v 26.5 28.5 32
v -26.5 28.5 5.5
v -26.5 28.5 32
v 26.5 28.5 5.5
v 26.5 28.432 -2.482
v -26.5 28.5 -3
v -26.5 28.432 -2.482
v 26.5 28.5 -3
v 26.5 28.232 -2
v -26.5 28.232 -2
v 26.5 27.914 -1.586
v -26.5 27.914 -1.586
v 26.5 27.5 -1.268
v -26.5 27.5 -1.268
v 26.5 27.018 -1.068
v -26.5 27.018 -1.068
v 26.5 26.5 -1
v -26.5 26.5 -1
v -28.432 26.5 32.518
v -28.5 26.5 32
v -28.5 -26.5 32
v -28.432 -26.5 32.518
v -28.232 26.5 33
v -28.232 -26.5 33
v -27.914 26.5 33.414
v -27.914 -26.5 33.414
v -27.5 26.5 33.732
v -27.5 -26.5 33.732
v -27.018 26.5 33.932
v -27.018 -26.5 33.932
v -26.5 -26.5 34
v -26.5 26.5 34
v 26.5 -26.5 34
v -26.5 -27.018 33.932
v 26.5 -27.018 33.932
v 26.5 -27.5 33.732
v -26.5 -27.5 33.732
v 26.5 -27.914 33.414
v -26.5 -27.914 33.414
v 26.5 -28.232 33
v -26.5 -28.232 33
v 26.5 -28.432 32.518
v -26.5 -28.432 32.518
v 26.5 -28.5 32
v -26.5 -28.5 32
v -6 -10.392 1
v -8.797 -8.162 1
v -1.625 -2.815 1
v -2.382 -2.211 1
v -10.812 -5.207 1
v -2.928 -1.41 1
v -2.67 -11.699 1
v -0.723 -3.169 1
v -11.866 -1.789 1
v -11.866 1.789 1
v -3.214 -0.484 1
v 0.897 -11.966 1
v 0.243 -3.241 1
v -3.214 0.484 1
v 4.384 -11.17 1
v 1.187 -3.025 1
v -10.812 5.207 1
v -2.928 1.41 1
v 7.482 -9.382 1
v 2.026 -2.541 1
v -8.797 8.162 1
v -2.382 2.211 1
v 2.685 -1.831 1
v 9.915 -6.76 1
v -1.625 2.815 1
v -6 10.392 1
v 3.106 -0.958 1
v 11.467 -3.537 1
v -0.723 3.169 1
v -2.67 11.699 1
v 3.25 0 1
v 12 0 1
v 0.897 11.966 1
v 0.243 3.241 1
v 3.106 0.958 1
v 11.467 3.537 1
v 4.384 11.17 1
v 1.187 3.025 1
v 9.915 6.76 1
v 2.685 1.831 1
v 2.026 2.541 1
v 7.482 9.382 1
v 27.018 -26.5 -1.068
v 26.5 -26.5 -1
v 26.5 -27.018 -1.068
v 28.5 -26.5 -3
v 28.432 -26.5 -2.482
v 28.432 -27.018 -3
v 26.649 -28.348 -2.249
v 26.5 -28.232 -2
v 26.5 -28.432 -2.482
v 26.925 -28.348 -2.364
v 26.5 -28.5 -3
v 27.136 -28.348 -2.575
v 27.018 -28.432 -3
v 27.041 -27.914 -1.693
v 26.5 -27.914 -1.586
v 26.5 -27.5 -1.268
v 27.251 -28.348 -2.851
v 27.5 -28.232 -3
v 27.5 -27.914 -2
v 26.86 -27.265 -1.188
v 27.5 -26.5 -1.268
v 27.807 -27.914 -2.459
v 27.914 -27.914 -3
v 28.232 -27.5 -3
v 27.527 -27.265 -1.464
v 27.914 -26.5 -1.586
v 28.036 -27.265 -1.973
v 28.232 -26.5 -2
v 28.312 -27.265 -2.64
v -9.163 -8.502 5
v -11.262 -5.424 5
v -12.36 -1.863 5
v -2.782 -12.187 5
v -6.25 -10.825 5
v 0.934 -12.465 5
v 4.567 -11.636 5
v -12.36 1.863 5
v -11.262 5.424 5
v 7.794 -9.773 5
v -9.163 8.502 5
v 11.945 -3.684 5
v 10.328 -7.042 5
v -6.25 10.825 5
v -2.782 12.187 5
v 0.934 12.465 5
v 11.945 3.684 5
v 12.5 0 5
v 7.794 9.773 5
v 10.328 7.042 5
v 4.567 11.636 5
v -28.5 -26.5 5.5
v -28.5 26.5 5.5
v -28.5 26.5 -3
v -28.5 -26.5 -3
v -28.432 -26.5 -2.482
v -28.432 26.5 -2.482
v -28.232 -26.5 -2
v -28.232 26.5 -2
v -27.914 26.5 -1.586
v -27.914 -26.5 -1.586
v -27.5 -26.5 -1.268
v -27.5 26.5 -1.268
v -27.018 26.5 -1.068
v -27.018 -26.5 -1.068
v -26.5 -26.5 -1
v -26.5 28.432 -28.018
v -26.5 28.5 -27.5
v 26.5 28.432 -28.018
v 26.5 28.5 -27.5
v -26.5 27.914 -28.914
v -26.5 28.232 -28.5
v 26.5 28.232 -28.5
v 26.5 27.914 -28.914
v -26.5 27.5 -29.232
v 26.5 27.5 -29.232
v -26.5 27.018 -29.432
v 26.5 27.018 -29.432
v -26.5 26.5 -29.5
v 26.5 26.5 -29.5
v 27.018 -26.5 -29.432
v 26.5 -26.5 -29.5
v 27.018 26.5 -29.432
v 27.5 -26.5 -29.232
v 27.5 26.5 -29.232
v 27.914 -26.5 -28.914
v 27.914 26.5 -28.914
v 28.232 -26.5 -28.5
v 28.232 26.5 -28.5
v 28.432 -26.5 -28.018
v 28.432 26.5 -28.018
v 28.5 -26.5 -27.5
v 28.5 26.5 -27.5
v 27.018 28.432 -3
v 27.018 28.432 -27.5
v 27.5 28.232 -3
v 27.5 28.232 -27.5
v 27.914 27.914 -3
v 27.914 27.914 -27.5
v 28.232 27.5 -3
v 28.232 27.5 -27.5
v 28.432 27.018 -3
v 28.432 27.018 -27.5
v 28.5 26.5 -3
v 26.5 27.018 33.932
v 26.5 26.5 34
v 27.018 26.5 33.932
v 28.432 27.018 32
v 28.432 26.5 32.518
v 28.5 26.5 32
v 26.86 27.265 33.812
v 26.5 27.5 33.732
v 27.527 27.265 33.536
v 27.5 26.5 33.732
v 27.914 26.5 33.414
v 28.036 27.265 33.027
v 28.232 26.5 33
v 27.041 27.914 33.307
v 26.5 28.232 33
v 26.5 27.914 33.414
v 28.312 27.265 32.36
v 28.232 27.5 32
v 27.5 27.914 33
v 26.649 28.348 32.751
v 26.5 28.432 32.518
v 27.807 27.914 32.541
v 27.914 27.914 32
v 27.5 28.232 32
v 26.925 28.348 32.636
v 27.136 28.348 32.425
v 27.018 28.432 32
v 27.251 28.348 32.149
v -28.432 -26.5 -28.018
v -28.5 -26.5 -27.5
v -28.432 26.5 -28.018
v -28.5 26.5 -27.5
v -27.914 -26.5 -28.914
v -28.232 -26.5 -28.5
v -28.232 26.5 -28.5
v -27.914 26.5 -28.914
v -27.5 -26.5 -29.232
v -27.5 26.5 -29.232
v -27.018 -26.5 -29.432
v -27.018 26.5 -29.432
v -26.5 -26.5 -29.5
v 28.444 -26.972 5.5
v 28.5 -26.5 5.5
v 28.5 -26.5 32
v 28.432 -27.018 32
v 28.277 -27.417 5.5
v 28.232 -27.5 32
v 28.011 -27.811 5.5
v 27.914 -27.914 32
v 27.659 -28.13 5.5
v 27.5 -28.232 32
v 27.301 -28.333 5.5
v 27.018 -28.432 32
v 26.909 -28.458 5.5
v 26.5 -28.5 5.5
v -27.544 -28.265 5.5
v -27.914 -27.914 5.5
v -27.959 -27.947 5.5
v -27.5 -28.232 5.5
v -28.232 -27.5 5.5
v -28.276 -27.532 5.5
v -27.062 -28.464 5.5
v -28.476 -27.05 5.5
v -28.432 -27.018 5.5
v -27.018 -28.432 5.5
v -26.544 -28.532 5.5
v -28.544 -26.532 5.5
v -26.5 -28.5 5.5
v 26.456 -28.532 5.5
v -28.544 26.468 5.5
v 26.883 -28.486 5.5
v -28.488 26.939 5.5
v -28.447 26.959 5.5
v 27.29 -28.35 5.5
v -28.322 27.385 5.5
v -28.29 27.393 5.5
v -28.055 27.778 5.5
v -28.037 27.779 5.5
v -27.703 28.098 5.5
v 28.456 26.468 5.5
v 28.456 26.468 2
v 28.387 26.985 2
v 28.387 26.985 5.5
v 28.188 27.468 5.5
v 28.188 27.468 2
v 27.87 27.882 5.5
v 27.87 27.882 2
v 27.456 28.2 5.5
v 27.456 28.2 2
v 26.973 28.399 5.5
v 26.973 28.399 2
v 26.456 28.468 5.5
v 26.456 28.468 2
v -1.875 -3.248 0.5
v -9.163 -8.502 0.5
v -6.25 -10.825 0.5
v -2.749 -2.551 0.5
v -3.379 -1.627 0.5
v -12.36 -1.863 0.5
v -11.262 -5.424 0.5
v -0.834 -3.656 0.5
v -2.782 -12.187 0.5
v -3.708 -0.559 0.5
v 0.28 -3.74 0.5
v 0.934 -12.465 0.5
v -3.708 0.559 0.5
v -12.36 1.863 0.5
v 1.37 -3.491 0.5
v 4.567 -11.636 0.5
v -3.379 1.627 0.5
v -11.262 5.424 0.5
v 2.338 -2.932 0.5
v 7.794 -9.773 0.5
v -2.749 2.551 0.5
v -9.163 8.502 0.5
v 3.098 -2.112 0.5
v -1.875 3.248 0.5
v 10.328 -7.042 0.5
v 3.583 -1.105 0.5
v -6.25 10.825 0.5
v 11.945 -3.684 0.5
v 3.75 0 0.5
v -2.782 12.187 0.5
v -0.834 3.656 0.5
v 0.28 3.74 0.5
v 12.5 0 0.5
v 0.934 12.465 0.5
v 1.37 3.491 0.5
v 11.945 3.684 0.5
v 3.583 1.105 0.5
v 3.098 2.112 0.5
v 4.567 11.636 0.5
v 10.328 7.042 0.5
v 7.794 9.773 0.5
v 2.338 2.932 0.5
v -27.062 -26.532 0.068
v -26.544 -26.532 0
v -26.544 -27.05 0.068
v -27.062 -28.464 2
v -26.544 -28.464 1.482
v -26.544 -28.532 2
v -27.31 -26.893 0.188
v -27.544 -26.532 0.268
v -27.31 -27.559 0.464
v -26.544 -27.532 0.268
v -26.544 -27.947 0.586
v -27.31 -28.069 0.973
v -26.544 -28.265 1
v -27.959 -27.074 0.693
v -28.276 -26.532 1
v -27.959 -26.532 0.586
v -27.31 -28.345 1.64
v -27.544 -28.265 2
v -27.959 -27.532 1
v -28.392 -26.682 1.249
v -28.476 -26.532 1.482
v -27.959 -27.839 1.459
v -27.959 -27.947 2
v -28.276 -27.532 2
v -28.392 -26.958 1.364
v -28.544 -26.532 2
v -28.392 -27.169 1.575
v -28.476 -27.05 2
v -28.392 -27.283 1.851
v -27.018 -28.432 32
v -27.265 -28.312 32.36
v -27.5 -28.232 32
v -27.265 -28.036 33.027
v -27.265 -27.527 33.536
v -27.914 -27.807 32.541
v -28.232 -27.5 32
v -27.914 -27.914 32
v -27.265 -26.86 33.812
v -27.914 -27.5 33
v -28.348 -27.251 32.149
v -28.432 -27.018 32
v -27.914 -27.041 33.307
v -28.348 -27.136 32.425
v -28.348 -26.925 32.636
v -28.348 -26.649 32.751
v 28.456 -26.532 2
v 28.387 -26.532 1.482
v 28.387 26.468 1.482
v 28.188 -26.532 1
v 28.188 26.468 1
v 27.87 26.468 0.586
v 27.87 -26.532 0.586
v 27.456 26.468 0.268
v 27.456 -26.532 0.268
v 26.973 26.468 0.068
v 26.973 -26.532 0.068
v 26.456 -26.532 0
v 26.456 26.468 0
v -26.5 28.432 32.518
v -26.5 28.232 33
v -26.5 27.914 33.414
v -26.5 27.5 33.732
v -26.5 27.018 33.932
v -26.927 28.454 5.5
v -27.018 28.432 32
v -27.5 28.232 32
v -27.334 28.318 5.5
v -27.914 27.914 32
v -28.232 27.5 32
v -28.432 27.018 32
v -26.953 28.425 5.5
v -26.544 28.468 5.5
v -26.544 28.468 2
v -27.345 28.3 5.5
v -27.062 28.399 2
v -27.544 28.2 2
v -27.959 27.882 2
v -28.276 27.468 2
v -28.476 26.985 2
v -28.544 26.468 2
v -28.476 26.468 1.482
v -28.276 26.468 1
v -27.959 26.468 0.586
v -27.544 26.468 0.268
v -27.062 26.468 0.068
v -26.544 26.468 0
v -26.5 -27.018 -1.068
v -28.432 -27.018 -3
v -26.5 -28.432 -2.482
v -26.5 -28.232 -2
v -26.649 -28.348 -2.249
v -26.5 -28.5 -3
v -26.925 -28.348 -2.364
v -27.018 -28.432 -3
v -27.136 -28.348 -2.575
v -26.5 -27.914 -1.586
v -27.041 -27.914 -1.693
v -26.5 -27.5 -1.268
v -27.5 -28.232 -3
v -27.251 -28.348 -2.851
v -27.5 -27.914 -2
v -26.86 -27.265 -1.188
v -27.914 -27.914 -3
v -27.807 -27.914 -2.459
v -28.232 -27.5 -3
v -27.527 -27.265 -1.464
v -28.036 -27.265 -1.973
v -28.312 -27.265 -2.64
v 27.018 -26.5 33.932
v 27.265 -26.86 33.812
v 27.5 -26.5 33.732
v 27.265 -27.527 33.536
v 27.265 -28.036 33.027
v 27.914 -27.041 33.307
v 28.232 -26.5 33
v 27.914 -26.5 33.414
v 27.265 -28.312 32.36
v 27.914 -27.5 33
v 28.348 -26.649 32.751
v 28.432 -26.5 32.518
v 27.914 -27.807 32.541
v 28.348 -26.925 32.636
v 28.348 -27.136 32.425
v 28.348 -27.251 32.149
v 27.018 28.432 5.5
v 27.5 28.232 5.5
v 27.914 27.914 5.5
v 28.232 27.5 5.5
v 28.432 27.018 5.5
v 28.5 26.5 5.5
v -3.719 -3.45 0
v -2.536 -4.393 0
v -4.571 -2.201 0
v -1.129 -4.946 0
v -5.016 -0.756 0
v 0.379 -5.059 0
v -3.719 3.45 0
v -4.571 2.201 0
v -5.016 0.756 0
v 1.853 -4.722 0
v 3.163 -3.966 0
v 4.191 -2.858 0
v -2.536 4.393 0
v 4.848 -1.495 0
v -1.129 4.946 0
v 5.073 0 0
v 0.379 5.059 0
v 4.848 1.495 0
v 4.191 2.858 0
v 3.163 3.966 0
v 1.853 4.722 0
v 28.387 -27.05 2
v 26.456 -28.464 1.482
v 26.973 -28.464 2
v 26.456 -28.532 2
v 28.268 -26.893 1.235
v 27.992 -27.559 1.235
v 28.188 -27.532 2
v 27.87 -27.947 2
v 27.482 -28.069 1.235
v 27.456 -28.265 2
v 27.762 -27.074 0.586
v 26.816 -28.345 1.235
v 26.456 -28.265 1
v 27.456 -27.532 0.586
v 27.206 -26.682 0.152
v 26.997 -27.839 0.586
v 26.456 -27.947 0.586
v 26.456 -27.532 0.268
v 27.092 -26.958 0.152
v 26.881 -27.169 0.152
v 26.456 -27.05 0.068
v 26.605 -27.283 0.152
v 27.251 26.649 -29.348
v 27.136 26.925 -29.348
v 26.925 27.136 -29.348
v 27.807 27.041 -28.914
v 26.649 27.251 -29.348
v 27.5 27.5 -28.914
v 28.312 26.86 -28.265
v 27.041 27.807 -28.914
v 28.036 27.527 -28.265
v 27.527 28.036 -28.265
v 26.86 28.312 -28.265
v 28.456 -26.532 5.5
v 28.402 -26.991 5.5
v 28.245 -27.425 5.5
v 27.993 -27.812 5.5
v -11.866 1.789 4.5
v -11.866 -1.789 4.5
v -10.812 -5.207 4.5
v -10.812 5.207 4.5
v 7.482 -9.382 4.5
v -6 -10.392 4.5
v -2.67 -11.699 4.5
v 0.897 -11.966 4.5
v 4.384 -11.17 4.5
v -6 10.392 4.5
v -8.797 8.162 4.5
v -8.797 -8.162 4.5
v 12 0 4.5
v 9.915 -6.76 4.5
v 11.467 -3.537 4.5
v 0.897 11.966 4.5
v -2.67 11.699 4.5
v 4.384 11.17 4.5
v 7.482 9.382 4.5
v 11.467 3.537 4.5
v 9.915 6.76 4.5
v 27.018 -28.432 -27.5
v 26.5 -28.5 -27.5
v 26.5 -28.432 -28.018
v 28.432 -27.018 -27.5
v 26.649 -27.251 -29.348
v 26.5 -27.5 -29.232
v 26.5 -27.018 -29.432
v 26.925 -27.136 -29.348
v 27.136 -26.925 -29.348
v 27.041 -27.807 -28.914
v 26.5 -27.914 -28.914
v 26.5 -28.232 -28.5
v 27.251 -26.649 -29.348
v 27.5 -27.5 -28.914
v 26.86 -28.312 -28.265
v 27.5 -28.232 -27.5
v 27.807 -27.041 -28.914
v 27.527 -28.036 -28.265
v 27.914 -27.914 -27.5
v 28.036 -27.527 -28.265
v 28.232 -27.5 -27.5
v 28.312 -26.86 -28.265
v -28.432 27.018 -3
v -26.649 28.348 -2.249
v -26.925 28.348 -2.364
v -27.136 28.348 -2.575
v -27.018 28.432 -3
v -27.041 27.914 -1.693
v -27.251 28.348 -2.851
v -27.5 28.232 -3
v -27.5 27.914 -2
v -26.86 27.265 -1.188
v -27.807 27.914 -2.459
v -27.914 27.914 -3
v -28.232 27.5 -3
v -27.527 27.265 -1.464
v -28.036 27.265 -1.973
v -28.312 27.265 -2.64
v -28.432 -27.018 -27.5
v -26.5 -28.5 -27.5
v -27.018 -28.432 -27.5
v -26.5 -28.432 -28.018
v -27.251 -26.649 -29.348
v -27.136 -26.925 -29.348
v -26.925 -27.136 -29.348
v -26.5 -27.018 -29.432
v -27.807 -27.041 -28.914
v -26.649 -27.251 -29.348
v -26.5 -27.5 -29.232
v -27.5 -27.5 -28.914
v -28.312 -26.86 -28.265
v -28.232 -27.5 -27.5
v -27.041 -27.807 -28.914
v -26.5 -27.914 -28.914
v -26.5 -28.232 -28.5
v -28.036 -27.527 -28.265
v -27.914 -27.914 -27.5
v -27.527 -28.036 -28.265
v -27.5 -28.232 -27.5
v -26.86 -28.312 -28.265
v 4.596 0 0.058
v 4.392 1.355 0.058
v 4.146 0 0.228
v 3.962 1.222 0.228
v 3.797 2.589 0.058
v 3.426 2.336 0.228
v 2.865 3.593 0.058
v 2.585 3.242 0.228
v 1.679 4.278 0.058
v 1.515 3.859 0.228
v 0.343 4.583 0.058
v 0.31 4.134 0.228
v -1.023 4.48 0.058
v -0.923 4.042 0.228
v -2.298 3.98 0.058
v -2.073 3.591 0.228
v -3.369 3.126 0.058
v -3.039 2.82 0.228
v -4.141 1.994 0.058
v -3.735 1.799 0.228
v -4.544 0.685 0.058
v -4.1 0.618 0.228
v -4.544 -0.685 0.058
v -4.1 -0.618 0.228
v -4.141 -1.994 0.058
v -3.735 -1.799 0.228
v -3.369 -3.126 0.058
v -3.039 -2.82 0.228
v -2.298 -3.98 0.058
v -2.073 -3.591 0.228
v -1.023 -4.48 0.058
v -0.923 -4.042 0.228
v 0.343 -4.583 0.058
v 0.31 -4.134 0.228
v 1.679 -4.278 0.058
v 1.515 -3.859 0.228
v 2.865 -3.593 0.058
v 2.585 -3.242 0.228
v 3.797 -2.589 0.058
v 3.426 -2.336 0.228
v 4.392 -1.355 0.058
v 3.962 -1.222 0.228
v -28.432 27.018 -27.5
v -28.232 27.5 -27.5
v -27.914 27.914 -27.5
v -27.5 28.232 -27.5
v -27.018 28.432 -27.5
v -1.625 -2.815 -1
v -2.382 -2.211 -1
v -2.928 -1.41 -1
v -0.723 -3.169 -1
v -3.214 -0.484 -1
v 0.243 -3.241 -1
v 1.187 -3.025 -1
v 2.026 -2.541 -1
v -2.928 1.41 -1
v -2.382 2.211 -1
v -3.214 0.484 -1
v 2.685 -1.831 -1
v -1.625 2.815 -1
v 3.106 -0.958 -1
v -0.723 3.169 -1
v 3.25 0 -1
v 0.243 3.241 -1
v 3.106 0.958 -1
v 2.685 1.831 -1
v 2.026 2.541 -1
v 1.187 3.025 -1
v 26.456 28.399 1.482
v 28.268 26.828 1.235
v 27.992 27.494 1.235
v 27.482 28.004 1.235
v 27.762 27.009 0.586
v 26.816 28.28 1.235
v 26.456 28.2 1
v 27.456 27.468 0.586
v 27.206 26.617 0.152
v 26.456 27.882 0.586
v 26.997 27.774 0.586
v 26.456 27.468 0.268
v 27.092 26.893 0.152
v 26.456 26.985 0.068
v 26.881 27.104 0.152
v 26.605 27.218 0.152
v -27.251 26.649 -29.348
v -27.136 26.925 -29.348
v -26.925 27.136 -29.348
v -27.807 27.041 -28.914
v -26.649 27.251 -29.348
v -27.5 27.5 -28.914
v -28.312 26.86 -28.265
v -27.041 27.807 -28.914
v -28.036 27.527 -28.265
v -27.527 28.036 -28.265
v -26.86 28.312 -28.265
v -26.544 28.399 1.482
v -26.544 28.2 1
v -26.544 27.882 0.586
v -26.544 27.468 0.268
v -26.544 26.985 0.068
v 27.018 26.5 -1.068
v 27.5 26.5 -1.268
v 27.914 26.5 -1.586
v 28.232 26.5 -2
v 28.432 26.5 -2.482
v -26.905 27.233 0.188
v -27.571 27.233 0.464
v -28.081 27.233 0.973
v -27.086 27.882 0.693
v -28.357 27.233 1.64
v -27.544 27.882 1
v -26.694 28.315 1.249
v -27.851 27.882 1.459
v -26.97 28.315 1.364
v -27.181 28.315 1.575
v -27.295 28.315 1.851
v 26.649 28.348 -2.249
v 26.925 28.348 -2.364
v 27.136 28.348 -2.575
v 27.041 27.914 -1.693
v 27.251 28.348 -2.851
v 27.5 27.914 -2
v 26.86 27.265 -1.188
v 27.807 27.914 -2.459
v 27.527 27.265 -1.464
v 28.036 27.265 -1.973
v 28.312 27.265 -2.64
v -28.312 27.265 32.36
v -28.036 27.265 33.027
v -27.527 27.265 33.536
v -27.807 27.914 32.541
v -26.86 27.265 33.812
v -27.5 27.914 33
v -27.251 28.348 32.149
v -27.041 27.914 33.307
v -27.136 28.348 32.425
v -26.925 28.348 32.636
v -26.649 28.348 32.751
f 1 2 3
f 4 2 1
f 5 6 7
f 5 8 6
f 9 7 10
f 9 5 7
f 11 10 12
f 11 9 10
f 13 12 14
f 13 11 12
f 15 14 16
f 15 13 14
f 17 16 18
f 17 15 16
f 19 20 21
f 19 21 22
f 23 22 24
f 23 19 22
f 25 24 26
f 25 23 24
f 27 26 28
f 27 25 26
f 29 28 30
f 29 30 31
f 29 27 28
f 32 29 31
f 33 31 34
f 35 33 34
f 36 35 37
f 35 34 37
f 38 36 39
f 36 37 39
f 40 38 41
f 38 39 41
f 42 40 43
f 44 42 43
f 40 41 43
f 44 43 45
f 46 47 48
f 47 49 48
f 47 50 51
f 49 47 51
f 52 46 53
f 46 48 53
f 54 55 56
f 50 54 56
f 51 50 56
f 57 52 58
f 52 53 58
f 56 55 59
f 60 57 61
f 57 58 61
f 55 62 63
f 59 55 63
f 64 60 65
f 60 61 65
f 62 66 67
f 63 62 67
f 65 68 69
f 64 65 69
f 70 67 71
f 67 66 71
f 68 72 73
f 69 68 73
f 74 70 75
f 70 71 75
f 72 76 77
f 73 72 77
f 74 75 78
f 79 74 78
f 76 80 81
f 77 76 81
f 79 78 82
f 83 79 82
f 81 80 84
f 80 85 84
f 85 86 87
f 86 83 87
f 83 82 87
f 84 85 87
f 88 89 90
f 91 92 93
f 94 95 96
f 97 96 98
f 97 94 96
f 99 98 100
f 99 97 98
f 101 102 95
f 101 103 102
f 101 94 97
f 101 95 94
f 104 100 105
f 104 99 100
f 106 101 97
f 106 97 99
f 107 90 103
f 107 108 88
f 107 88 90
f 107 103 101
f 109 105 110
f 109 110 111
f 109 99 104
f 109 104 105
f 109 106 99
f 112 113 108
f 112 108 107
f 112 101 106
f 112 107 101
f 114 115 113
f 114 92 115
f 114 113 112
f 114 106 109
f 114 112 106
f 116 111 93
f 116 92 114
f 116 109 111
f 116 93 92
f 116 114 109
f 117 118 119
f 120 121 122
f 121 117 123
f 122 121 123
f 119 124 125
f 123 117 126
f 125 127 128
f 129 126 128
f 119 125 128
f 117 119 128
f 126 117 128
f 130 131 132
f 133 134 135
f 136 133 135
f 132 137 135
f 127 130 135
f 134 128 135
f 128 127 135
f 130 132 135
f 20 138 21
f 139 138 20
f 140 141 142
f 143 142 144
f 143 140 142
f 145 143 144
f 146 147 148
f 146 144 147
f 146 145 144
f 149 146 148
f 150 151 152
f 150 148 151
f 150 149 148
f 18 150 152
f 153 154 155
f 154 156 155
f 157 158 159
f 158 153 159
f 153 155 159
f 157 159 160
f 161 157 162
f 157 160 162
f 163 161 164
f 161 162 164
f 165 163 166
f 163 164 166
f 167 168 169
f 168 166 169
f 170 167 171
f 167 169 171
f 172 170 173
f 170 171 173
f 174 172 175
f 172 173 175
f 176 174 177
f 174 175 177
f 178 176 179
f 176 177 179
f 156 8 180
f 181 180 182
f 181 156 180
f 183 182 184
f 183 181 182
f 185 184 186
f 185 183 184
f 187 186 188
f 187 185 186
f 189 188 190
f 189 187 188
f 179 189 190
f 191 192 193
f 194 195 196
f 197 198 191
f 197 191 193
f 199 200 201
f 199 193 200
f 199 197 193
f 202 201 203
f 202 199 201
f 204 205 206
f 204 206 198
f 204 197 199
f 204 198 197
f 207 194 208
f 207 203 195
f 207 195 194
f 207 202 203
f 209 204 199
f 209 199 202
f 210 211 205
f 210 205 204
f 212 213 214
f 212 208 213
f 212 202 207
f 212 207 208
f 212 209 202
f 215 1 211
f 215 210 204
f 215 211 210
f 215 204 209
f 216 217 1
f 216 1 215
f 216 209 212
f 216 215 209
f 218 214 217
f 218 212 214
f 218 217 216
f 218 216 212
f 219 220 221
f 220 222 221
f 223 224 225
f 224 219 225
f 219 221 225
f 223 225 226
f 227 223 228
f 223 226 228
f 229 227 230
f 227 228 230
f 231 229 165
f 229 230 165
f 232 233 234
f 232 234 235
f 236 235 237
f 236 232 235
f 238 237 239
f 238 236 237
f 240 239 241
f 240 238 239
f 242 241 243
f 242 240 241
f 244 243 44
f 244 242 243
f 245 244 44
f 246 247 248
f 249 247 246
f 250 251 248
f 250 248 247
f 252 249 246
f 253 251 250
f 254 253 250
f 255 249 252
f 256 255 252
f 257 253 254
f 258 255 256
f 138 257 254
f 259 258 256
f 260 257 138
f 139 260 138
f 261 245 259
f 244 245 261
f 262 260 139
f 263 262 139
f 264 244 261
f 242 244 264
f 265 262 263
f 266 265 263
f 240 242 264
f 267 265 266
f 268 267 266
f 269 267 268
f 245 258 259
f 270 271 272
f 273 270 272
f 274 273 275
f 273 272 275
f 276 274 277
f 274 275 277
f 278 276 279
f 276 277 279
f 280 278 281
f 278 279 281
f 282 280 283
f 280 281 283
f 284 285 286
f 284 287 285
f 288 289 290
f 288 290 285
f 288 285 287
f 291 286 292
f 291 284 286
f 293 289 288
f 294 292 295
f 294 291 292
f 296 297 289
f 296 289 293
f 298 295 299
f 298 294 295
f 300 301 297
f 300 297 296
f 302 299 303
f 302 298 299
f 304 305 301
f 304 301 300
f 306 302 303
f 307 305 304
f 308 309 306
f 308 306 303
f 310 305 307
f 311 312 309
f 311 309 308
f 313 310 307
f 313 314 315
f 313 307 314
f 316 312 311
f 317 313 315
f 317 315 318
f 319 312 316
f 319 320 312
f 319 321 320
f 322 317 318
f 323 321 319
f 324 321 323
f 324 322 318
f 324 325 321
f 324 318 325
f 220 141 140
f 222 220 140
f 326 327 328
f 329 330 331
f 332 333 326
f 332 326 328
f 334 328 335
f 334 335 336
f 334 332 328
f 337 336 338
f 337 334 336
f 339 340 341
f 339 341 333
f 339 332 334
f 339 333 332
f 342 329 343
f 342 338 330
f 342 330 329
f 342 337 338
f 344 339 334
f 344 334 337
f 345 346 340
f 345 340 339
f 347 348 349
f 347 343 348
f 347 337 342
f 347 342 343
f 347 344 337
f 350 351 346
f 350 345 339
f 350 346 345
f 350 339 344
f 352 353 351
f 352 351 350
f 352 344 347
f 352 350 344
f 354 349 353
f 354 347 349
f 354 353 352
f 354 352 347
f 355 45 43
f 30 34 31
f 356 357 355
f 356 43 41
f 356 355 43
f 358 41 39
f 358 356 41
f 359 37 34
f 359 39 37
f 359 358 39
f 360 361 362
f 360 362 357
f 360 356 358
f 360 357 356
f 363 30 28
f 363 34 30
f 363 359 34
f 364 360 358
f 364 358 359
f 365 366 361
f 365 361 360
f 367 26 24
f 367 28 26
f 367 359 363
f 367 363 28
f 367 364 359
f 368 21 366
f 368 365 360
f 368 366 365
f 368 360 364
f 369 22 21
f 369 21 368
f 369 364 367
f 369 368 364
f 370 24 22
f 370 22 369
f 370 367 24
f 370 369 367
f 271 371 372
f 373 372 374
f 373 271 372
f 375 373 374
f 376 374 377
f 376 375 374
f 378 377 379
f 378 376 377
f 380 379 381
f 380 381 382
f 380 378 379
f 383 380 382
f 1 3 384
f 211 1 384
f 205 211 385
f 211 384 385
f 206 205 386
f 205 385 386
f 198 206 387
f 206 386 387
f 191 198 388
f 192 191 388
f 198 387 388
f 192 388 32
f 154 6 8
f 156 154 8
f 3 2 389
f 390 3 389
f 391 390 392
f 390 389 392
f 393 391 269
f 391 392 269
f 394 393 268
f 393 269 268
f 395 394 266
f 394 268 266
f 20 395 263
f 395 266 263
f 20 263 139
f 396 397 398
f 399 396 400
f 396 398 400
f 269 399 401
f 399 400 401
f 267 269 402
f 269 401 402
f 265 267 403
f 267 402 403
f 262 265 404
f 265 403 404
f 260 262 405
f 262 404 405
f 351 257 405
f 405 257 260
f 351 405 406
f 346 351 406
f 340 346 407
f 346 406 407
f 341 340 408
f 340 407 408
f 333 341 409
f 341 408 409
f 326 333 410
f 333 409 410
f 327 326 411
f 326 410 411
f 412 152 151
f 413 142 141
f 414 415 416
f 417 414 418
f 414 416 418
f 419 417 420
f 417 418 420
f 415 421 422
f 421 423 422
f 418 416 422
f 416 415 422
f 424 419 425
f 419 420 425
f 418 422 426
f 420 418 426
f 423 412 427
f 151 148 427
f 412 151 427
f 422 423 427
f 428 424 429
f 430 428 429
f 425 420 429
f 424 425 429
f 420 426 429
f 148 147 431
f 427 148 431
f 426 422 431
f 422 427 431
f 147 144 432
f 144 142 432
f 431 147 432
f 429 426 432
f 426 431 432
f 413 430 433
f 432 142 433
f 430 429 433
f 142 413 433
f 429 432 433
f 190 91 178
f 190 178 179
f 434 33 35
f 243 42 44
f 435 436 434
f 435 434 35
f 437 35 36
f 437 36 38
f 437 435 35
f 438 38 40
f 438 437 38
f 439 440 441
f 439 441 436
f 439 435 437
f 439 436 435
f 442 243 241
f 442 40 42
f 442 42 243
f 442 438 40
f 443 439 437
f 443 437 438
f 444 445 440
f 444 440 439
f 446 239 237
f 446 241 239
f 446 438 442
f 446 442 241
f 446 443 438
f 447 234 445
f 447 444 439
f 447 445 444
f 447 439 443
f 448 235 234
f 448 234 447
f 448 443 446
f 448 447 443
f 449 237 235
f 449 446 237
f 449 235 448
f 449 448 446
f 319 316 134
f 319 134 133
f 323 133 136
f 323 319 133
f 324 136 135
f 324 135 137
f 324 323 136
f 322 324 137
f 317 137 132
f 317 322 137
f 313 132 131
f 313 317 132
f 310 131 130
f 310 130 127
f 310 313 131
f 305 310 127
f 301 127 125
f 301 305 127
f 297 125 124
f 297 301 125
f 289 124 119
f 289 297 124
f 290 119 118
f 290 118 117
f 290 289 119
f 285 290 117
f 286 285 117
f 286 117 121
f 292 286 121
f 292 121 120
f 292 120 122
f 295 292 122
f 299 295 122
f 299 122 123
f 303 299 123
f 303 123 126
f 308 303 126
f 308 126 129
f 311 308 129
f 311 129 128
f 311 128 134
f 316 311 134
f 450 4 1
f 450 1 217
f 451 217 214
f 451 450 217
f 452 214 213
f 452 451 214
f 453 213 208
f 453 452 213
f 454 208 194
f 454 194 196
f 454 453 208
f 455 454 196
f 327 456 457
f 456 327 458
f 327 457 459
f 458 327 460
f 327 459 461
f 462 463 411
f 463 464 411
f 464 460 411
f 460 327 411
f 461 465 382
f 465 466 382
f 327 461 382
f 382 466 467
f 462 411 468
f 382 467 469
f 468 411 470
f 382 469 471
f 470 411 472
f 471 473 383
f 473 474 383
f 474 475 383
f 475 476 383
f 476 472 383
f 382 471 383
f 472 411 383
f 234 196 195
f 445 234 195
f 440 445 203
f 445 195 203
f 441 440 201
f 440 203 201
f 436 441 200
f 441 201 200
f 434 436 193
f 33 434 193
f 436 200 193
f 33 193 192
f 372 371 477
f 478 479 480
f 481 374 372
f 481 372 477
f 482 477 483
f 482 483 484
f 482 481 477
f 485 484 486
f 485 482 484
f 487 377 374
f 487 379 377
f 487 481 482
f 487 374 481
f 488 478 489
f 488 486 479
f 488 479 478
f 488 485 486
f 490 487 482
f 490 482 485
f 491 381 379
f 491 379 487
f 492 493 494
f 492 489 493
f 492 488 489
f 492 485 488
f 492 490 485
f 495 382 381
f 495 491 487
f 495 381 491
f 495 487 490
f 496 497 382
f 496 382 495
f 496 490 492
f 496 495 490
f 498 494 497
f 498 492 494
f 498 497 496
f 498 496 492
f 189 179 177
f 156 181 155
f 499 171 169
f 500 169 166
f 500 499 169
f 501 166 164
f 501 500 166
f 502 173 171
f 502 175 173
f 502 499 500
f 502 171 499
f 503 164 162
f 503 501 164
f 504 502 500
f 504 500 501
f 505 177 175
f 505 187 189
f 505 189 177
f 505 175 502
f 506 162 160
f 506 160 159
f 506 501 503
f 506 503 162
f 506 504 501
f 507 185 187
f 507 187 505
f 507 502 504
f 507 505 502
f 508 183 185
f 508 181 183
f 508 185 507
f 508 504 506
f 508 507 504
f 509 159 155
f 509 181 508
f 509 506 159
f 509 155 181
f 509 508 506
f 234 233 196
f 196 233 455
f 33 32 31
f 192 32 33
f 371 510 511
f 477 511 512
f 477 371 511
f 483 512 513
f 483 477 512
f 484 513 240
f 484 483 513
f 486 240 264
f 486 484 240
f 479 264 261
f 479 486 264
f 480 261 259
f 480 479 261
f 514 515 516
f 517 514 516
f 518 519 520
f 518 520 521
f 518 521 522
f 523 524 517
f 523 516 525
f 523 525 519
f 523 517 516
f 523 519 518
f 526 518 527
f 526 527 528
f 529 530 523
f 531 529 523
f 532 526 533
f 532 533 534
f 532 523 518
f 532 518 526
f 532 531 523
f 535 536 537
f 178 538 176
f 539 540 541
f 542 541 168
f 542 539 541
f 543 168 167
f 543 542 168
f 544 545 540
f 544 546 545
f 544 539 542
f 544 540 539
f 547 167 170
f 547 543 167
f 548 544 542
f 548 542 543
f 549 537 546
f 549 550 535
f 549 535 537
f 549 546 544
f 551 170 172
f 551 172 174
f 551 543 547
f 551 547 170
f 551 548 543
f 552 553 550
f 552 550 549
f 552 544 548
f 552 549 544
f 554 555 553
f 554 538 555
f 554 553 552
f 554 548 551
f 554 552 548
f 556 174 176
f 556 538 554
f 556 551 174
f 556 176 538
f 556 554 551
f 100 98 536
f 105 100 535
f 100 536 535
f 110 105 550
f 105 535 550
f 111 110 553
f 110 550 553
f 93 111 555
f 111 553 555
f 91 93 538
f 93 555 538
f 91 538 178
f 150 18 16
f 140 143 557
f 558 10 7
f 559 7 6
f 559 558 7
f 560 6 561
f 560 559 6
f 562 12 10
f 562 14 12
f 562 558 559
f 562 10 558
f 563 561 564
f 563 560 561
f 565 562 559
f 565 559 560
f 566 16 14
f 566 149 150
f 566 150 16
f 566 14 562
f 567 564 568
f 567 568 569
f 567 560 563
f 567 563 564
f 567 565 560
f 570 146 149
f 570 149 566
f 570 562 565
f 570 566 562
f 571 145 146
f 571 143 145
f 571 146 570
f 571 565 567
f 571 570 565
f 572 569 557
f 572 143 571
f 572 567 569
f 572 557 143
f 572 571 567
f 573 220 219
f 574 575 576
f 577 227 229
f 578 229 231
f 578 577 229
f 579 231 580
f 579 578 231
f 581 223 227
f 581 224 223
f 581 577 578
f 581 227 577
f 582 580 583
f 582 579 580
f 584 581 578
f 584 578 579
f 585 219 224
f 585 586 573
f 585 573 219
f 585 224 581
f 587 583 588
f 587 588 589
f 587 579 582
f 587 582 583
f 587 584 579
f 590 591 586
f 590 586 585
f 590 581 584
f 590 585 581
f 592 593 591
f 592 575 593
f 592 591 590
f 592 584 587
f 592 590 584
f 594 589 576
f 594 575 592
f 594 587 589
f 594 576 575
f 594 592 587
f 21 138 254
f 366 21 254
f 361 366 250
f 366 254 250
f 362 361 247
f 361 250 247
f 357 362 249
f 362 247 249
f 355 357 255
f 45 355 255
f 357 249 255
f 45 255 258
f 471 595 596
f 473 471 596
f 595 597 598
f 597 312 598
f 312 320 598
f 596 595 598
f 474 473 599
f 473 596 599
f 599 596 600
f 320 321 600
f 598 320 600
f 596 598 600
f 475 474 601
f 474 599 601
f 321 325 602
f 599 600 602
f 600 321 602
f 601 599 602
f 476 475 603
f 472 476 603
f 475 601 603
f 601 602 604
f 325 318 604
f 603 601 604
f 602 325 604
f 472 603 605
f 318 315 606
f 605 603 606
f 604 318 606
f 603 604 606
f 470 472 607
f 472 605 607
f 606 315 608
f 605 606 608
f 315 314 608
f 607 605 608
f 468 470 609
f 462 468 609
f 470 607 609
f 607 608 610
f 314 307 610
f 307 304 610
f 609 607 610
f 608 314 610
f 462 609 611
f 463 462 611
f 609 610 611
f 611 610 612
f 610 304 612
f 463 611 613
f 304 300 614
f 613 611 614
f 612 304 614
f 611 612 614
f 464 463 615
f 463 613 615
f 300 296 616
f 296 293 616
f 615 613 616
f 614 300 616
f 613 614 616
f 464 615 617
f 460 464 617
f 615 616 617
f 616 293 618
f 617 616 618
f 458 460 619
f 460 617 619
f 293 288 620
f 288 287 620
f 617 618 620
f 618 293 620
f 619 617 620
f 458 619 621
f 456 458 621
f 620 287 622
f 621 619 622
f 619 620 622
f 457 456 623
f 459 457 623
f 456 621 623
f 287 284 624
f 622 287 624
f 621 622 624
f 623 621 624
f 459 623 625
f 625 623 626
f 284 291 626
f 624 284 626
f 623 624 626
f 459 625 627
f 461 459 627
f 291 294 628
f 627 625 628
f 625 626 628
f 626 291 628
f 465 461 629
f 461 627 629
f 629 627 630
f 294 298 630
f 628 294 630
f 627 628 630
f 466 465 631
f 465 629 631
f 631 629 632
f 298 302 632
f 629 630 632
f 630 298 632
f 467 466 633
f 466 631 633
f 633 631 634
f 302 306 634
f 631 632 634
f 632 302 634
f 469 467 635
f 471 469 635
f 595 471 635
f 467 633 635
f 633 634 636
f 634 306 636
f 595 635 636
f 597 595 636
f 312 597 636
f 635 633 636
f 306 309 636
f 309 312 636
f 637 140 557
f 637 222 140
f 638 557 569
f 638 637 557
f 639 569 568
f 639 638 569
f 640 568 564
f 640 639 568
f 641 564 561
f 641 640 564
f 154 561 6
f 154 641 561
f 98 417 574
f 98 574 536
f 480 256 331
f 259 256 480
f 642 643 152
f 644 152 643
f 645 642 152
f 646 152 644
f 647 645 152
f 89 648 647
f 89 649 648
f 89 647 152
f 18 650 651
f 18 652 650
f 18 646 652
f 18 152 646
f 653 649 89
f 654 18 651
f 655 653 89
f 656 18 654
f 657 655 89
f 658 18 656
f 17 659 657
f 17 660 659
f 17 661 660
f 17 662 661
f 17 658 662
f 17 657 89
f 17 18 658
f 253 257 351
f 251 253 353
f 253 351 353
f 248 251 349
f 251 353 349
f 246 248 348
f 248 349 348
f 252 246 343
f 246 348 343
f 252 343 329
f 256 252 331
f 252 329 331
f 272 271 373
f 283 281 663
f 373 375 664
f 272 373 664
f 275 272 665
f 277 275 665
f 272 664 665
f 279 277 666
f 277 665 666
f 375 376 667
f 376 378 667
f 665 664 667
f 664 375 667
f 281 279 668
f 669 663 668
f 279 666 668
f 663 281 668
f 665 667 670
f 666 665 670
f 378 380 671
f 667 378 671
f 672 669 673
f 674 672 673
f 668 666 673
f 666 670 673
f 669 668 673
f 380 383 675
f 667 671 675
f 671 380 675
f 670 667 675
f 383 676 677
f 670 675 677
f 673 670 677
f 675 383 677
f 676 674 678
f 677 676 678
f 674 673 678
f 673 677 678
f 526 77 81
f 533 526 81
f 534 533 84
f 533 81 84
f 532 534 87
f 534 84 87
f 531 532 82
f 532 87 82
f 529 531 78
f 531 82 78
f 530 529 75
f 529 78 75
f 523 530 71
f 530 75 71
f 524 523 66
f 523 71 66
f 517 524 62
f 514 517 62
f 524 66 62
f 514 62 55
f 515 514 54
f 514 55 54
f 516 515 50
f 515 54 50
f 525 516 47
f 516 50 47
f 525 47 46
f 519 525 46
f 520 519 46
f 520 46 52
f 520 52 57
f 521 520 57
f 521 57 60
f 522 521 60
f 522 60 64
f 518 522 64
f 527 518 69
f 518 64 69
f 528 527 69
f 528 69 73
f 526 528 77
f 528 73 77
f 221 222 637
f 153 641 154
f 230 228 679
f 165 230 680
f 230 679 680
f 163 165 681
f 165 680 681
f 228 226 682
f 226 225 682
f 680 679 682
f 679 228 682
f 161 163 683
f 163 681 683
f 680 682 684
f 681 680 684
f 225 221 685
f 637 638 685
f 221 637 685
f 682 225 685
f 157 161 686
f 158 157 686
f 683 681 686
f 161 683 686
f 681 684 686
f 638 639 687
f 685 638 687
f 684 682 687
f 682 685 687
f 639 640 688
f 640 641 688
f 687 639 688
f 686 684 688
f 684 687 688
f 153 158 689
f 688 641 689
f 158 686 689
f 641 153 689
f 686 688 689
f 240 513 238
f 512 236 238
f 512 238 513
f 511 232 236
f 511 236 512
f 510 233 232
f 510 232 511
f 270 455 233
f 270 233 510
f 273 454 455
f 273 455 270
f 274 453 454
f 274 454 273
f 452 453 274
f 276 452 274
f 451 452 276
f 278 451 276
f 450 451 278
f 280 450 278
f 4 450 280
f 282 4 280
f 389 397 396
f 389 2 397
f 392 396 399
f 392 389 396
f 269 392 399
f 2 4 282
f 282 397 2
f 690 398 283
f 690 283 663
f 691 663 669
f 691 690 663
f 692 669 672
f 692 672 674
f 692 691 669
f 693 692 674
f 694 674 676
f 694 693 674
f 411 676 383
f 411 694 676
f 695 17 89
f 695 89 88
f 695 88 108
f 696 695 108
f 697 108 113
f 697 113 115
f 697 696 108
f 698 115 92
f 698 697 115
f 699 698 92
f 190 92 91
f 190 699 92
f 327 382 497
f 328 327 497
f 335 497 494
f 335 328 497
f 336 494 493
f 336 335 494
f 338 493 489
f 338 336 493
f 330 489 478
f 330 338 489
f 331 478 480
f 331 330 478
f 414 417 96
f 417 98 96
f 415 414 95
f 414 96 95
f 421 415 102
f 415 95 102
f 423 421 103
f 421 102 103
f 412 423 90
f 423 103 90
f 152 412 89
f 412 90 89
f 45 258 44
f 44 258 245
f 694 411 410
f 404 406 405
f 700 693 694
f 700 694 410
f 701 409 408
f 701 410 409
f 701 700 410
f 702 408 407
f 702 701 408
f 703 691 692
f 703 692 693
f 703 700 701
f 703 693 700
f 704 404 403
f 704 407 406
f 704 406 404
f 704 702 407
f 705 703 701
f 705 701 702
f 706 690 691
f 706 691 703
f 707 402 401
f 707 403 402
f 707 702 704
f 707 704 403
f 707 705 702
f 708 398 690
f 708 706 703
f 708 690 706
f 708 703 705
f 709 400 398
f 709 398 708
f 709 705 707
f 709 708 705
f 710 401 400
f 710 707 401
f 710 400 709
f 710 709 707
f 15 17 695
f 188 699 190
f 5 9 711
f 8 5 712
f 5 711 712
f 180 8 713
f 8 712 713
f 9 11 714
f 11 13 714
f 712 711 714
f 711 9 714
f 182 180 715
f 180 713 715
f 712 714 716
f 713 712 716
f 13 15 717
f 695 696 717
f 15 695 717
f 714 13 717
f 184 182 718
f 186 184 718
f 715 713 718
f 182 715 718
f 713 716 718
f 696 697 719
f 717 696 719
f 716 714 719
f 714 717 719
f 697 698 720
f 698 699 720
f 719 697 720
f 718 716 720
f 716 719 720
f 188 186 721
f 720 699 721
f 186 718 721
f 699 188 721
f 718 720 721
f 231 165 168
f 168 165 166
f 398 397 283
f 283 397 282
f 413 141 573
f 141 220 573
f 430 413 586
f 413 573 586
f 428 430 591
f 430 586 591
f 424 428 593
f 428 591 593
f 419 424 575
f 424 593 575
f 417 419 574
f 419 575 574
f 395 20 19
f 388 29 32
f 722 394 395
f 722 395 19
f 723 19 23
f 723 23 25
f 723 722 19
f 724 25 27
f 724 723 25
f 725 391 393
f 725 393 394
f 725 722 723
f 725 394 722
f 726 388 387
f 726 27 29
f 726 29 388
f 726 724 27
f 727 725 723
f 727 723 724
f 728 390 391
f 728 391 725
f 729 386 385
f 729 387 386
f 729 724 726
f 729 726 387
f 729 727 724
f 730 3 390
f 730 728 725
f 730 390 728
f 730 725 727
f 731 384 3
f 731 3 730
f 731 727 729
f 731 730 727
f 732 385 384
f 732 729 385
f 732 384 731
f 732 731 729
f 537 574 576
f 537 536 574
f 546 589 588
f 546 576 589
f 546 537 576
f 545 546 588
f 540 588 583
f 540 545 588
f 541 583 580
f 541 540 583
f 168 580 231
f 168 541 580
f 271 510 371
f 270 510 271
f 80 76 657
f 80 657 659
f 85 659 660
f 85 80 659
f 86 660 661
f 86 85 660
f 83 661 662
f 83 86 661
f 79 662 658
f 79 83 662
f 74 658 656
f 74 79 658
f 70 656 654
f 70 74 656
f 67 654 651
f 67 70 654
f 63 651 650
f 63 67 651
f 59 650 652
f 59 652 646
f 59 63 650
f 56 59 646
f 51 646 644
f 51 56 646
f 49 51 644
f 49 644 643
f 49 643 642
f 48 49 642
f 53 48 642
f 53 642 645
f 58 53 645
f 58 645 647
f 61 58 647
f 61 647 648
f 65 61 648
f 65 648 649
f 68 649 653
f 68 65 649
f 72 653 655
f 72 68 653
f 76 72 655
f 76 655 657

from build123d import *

# Parameters (mm, degrees)
F0_R          = 13.5
F0_R_2        = 12.5
F1_DEPTH      = 5
F3_R          = 12
F4_DEPTH      = 3.5
F5_R          = 12.5
F5_R_2        = 3.75
F6_DEPTH      = 0.5
F8_R          = 13.5
F9_DEPTH      = 0.5
F10_R         = 3.25
F11_DEPTH     = 2
F13_W         = 57
F13_H         = 57
F14_DEPTH     = 28.5
F15_R         = 2
F17_W         = 57
F17_H         = 57
F18_DEPTH     = 28.5
F19_W         = 57
F19_H         = 57
F19_R         = 13.5
F20_DEPTH     = 5.5
F21_T1_DEPTH  = 26.5
F21_T3_DEPTH  = 5.5
F21_T5_DEPTH  = 53
F21_T7_DEPTH  = 53
F21_S11_W     = 2.04
F21_S11_H     = 2.04
F21_T12_DEPTH = 2.04
F21_S17_W     = 2.04
F21_S17_H     = 2.04
F21_T18_DEPTH = 2.04
F21_S23_W     = 2.04
F21_S23_H     = 2.04
F21_T24_DEPTH = 2.04
F21_S29_W     = 2.04
F21_S29_H     = 2.04
F21_T30_DEPTH = 2.04
F22_T1_DEPTH  = 3.5
F22_T3_DEPTH  = 8.5
F22_T5_DEPTH  = 53
F22_T7_DEPTH  = 53
F22_S11_W     = 2.04
F22_S11_H     = 2.04
F22_T12_DEPTH = 2.04
F22_S17_W     = 2.04
F22_S17_H     = 2.04
F22_T18_DEPTH = 2.04
F22_S23_W     = 2.04
F22_S23_H     = 2.04
F22_T24_DEPTH = 2.04
F22_T28_ANGLE = 89.9999999955


# Not quite as in the source:
# - a fillet or chamfer that OpenCascade refuses, or shapes differently, is made with other operations: its cross-section is extruded or revolved along the edge and cut away or added


with BuildPart() as f1:
    # F0 (on Top) → F1 (new body)
    with BuildSketch(Plane.XY):
        Circle(F0_R)
        Circle(F0_R_2, mode=Mode.SUBTRACT)
    extrude(amount=F1_DEPTH)

    # F5 (on Top) → F6 (join)
    with BuildSketch(Plane.XY):
        Circle(F5_R)
        Circle(F5_R_2, mode=Mode.SUBTRACT)
    extrude(amount=F6_DEPTH)

    # F8 (on offset) → F9 (join)
    with BuildSketch(Plane.XY.offset(5)):
        Circle(F8_R)
    extrude(amount=F9_DEPTH)

    # F17 (on offset) → F18 (join)
    with BuildSketch(Plane.XY.offset(5.5)):
        Rectangle(F17_W, F17_H)
    extrude(amount=F18_DEPTH)

    # F19 (on offset) → F20 (join)
    with BuildSketch(Plane.XY.offset(5.5)):
        with Locations((-0.0443849862, -0.0324733704)):
            Rectangle(F19_W, F19_H)
        Circle(F19_R, mode=Mode.SUBTRACT)
    extrude(amount=-F20_DEPTH)

    # F21: fillet of radius 2 on 9 edges, made by hand

    # F21_s2 → F21_t1 (cut)
    with BuildSketch(Plane.XY.offset(5.5)):
        with BuildLine():
            ThreePointArc((26.5, 28.5), (27.9142135624, 27.9142135624), (28.5, 26.5))
            Line((28.5, 26.5), (28.54, 26.5))
            Line((28.54, 26.5), (28.54, 28.54))
            Line((28.54, 28.54), (26.5, 28.54))
            Line((26.5, 28.54), (26.5, 28.5))
        make_face()
        with BuildLine():
            ThreePointArc((28.5, -26.5), (27.9142135624, -27.9142135624), (26.5, -28.5))
            Line((26.5, -28.5), (26.5, -28.54))
            Line((26.5, -28.54), (28.54, -28.54))
            Line((28.54, -28.54), (28.54, -26.5))
            Line((28.54, -26.5), (28.5, -26.5))
        make_face()
        with BuildLine():
            ThreePointArc((-28.5, -26.5), (-27.9142135624, -27.9142135624), (-26.5, -28.5))
            Line((-26.5, -28.5), (-26.5, -28.54))
            Line((-26.5, -28.54), (-28.54, -28.54))
            Line((-28.54, -28.54), (-28.54, -26.5))
            Line((-28.54, -26.5), (-28.5, -26.5))
        make_face()
        with BuildLine():
            ThreePointArc((-26.5, 28.5), (-27.9142135624, 27.9142135624), (-28.5, 26.5))
            Line((-28.5, 26.5), (-28.54, 26.5))
            Line((-28.54, 26.5), (-28.54, 28.54))
            Line((-28.54, 28.54), (-26.5, 28.54))
            Line((-26.5, 28.54), (-26.5, 28.5))
        make_face()
    extrude(amount=F21_T1_DEPTH, mode=Mode.SUBTRACT)

    # F21_s4 → F21_t3 (cut)
    with BuildSketch(Plane.XY):
        with BuildLine():
            ThreePointArc((28.4556150138, 26.4675266296), (27.8698285762, 27.8817401919), (26.4556150138, 28.4675266296))
            Line((26.4556150138, 28.4675266296), (26.4556150138, 28.5075266296))
            Line((26.4556150138, 28.5075266296), (28.4956150138, 28.5075266296))
            Line((28.4956150138, 28.5075266296), (28.4956150138, 26.4675266296))
            Line((28.4956150138, 26.4675266296), (28.4556150138, 26.4675266296))
        make_face()
    extrude(amount=F21_T3_DEPTH, mode=Mode.SUBTRACT)

    # F21_s6 → F21_t5 (cut)
    with BuildSketch(Plane.YZ.offset(-26.5)):
        with BuildLine():
            ThreePointArc((28.5, 32), (27.9142135624, 33.4142135624), (26.5, 34))
            Line((26.5, 34), (26.5, 34.04))
            Line((26.5, 34.04), (28.54, 34.04))
            Line((28.54, 34.04), (28.54, 32))
            Line((28.54, 32), (28.5, 32))
        make_face()
        with BuildLine():
            ThreePointArc((-26.5, 34), (-27.9142135624, 33.4142135624), (-28.5, 32))
            Line((-28.5, 32), (-28.54, 32))
            Line((-28.54, 32), (-28.54, 34.04))
            Line((-28.54, 34.04), (-26.5, 34.04))
            Line((-26.5, 34.04), (-26.5, 34))
        make_face()
    extrude(amount=F21_T5_DEPTH, mode=Mode.SUBTRACT)

    # F21_s8 → F21_t7 (cut)
    with BuildSketch(Plane.XZ.offset(-26.5)):
        with BuildLine():
            ThreePointArc((-28.5, 32), (-27.9142135624, 33.4142135624), (-26.5, 34))
            Line((-26.5, 34), (-26.5, 34.04))
            Line((-26.5, 34.04), (-28.54, 34.04))
            Line((-28.54, 34.04), (-28.54, 32))
            Line((-28.54, 32), (-28.5, 32))
        make_face()
        with BuildLine():
            ThreePointArc((28.5, 32), (27.9142135624, 33.4142135624), (26.5, 34))
            Line((26.5, 34), (26.5, 34.04))
            Line((26.5, 34.04), (28.54, 34.04))
            Line((28.54, 34.04), (28.54, 32))
            Line((28.54, 32), (28.5, 32))
        make_face()
    extrude(amount=F21_T7_DEPTH, mode=Mode.SUBTRACT)


with BuildPart() as f4:
    # F3 (on offset) → F4 (new body)
    with BuildSketch(Plane.XY.offset(1)):
        Circle(F3_R)
    extrude(amount=F4_DEPTH)

    # F10 (on offset) → F11 (join)
    with BuildSketch(Plane.XY.offset(1)):
        Circle(F10_R)
    extrude(amount=-F11_DEPTH)

    # F13 (on offset) → F14 (join)
    with BuildSketch(Plane.XY.offset(-1)):
        Rectangle(F13_W, F13_H)
    extrude(amount=-F14_DEPTH)

    # F15
    f15_edges = [f4.edges().sort_by_distance(p)[0] for p in [
        (28.5, 0, -1),
        (-28.5, 0, -1),
        (0, -28.5, -1),
        (0, 28.5, -1),
        (-28.5, 28.5, -15.25),
        (28.5, 28.5, -15.25),
        (-28.5, -28.5, -15.25),
        (28.5, -28.5, -15.25),
        (-28.5, 0, -29.5),
        (0, -28.5, -29.5),
        (28.5, 0, -29.5),
        (0, 28.5, -29.5),
    ]]
    fillet(f15_edges, radius=F15_R)


with BuildPart() as f21_tool10:
    # F21_s11 → F21_t12 (new body)
    with BuildSketch(Plane.XZ.offset(-26.5)):
        with Locations((27.52, 33.02)):
            Rectangle(F21_S11_W, F21_S11_H)
    extrude(amount=-F21_T12_DEPTH)

    # F21_s13 → F21_t14 (revolve, cut)
    with BuildSketch(Plane(origin=(26.5, 26.5, 32), x_dir=(-0.7071067812, 0, -0.7071067812), z_dir=(0.7071067812, 0, -0.7071067812))):
        with BuildLine():
            ThreePointArc((0, -2), (2, 0), (0, 2))
            Line((0, 2), (0, -2))
        make_face()
    revolve(axis=Axis((26.5, 26.5, 32), (0, 1, 0)), mode=Mode.SUBTRACT)


with BuildPart() as f1_1:
    add(f1.part)

    # F21_t9: cut F21_tool10
    add(f21_tool10.part, mode=Mode.SUBTRACT)


with BuildPart() as f21_tool16:
    # F21_s17 → F21_t18 (new body)
    with BuildSketch(Plane.XZ.offset(-26.5)):
        with Locations((-27.52, 33.02)):
            Rectangle(F21_S17_W, F21_S17_H)
    extrude(amount=-F21_T18_DEPTH)

    # F21_s19 → F21_t20 (revolve, cut)
    with BuildSketch(Plane(origin=(-26.5, 26.5, 32), x_dir=(0.7071067812, 0, -0.7071067812), z_dir=(0.7071067812, 0, 0.7071067812))):
        with BuildLine():
            ThreePointArc((0, -2), (2, 0), (0, 2))
            Line((0, 2), (0, -2))
        make_face()
    revolve(axis=Axis((-26.5, 26.5, 32), (0, 1, 0)), mode=Mode.SUBTRACT)


with BuildPart() as f1_2:
    add(f1_1.part)

    # F21_t15: cut F21_tool16
    add(f21_tool16.part, mode=Mode.SUBTRACT)


with BuildPart() as f21_tool22:
    # F21_s23 → F21_t24 (new body)
    with BuildSketch(Plane.YZ.offset(-26.5)):
        with Locations((-27.52, 33.02)):
            Rectangle(F21_S23_W, F21_S23_H)
    extrude(amount=-F21_T24_DEPTH)

    # F21_s25 → F21_t26 (revolve, cut)
    with BuildSketch(Plane(origin=(-26.5, -26.5, 32), x_dir=(0, 0.7071067812, -0.7071067812), z_dir=(0, 0.7071067812, 0.7071067812))):
        with BuildLine():
            ThreePointArc((0, -2), (2, 0), (0, 2))
            Line((0, 2), (0, -2))
        make_face()
    revolve(axis=Axis((-26.5, -26.5, 32), (-1, 0, 0)), mode=Mode.SUBTRACT)


with BuildPart() as f1_3:
    add(f1_2.part)

    # F21_t21: cut F21_tool22
    add(f21_tool22.part, mode=Mode.SUBTRACT)


with BuildPart() as f21_tool28:
    # F21_s29 → F21_t30 (new body)
    with BuildSketch(Plane.YZ.offset(26.5)):
        with Locations((-27.52, 33.02)):
            Rectangle(F21_S29_W, F21_S29_H)
    extrude(amount=F21_T30_DEPTH)

    # F21_s31 → F21_t32 (revolve, cut)
    with BuildSketch(Plane(origin=(26.5, -26.5, 32), x_dir=(0, 0.7071067812, -0.7071067812), z_dir=(0, -0.7071067812, -0.7071067812))):
        with BuildLine():
            ThreePointArc((0, -2), (2, 0), (0, 2))
            Line((0, 2), (0, -2))
        make_face()
    revolve(axis=Axis((26.5, -26.5, 32), (1, 0, 0)), mode=Mode.SUBTRACT)


with BuildPart() as f1_4:
    add(f1_3.part)

    # F21_t27: cut F21_tool28
    add(f21_tool28.part, mode=Mode.SUBTRACT)

    # F22: fillet of radius 2 on 9 edges, made by hand

    # F22_s2 → F22_t1 (cut)
    with BuildSketch(Plane.XY.offset(2)):
        with BuildLine():
            ThreePointArc((28.4556150138, -26.5324733704), (27.8698285762, -27.9466869328), (26.4556150138, -28.5324733704))
            Line((26.4556150138, -28.5324733704), (28.4556150138, -28.5324733704))
            Line((28.4556150138, -28.5324733704), (28.4556150138, -26.5324733704))
        make_face()
        with BuildLine():
            ThreePointArc((-26.5443849862, 28.4675266296), (-27.9585985485, 27.8817401919), (-28.5443849862, 26.4675266296))
            Line((-28.5443849862, 26.4675266296), (-28.5443849862, 28.4675266296))
            Line((-28.5443849862, 28.4675266296), (-26.5443849862, 28.4675266296))
        make_face()
    extrude(amount=F22_T1_DEPTH, mode=Mode.SUBTRACT)

    # F22_s4 → F22_t3 (cut)
    with BuildSketch(Plane.XY.offset(2)):
        with BuildLine():
            ThreePointArc((-28.5443849862, -26.5324733704), (-27.9585985485, -27.9466869328), (-26.5443849862, -28.5324733704))
            Line((-26.5443849862, -28.5324733704), (-28.5443849862, -28.5324733704))
            Line((-28.5443849862, -28.5324733704), (-28.5443849862, -26.5324733704))
        make_face()
    extrude(amount=F22_T3_DEPTH, mode=Mode.SUBTRACT)

    # F22_s6 → F22_t5 (cut)
    with BuildSketch(Plane.YZ.offset(-26.5443849862)):
        with BuildLine():
            ThreePointArc((28.4675266296, 2), (27.8817401919, 0.5857864376), (26.4675266296, 0))
            Line((26.4675266296, 0), (28.4675266296, 0))
            Line((28.4675266296, 0), (28.4675266296, 2))
        make_face()
        with BuildLine():
            ThreePointArc((-26.5324733704, 0), (-27.9466869328, 0.5857864376), (-28.5324733704, 2))
            Line((-28.5324733704, 2), (-28.5324733704, 0))
            Line((-28.5324733704, 0), (-26.5324733704, 0))
        make_face()
    extrude(amount=F22_T5_DEPTH, mode=Mode.SUBTRACT)

    # F22_s8 → F22_t7 (cut)
    with BuildSketch(Plane.XZ.offset(-26.4675266296)):
        with BuildLine():
            ThreePointArc((28.4556150138, 2), (27.8698285762, 0.5857864376), (26.4556150138, 0))
            Line((26.4556150138, 0), (28.4556150138, 0))
            Line((28.4556150138, 0), (28.4556150138, 2))
        make_face()
        with BuildLine():
            ThreePointArc((-28.5443849862, 2), (-27.9585985485, 0.5857864376), (-26.5443849862, 0))
            Line((-26.5443849862, 0), (-28.5443849862, 0))
            Line((-28.5443849862, 0), (-28.5443849862, 2))
        make_face()
    extrude(amount=F22_T7_DEPTH, mode=Mode.SUBTRACT)


with BuildPart() as f22_tool10:
    # F22_s11 → F22_t12 (new body)
    with BuildSketch(Plane.XY.offset(2)):
        with Locations((27.4756150138, -27.5524733704)):
            Rectangle(F22_S11_W, F22_S11_H)
    extrude(amount=-F22_T12_DEPTH)

    # F22_s13 → F22_t14 (revolve, cut)
    with BuildSketch(Plane(origin=(26.4556150138, -26.5324733704, 2), x_dir=(-0.7071067812, 0.7071067812, 0), z_dir=(-0.7071067812, -0.7071067812, 0))):
        with BuildLine():
            ThreePointArc((0, -2), (2, 0), (0, 2))
            Line((0, 2), (0, -2))
        make_face()
    revolve(axis=Axis((26.4556150138, -26.5324733704, 2), (0, 0, -1)), mode=Mode.SUBTRACT)


with BuildPart() as f1_5:
    add(f1_4.part)

    # F22_t9: cut F22_tool10
    add(f22_tool10.part, mode=Mode.SUBTRACT)


with BuildPart() as f22_tool16:
    # F22_s17 → F22_t18 (new body)
    with BuildSketch(Plane.YZ.offset(-26.5443849862)):
        with Locations((-27.5524733704, 0.98)):
            Rectangle(F22_S17_W, F22_S17_H)
    extrude(amount=-F22_T18_DEPTH)

    # F22_s19 → F22_t20 (revolve, cut)
    with BuildSketch(Plane(origin=(-26.5443849862, -26.5324733704, 2), x_dir=(0, 0.7071067812, 0.7071067812), z_dir=(0, -0.7071067812, 0.7071067812))):
        with BuildLine():
            ThreePointArc((0, -2), (2, 0), (0, 2))
            Line((0, 2), (0, -2))
        make_face()
    revolve(axis=Axis((-26.5443849862, -26.5324733704, 2), (-1, 0, 0)), mode=Mode.SUBTRACT)


with BuildPart() as f1_6:
    add(f1_5.part)

    # F22_t15: cut F22_tool16
    add(f22_tool16.part, mode=Mode.SUBTRACT)


with BuildPart() as f22_tool22:
    # F22_s23 → F22_t24 (new body)
    with BuildSketch(Plane.XZ.offset(-26.4675266296)):
        with Locations((-27.5643849862, 0.98)):
            Rectangle(F22_S23_W, F22_S23_H)
    extrude(amount=-F22_T24_DEPTH)

    # F22_s25 → F22_t26 (revolve, cut)
    with BuildSketch(Plane(origin=(-26.5443849862, 26.4675266296, 2), x_dir=(0.7071067812, 0, 0.7071067812), z_dir=(-0.7071067812, 0, 0.7071067812))):
        with BuildLine():
            ThreePointArc((0, -2), (2, 0), (0, 2))
            Line((0, 2), (0, -2))
        make_face()
    revolve(axis=Axis((-26.5443849862, 26.4675266296, 2), (0, 1, 0)), mode=Mode.SUBTRACT)


with BuildPart() as f1_7:
    add(f1_6.part)

    # F22_t21: cut F22_tool22
    add(f22_tool22.part, mode=Mode.SUBTRACT)

    # F22_s27 → F22_t28 (revolve, cut)
    with BuildSketch(Plane.XZ.offset(-26.4675266295)):
        with BuildLine():
            ThreePointArc((28.4556150138, 2), (27.8698285762, 0.5857864376), (26.4556150138, 0))
            Line((26.4556150138, 0), (28.4556150138, 0))
            Line((28.4556150138, 0), (28.4556150138, 2))
        make_face()
    revolve(axis=Axis((26.4556150137, 26.4675266295, 0), (0, 0, 1)), revolution_arc=F22_T28_ANGLE, mode=Mode.SUBTRACT)

    # F22_s29 → F22_t30 (revolve, cut)
    with BuildSketch(Plane.XZ):
        with BuildLine():
            ThreePointArc((5.0728756555, 0), (4.3657688743, 0.1291713066), (3.75, 0.5))
            Line((3.75, 0.5), (3.75, 0))
            Line((3.75, 0), (5.0728756555, 0))
        make_face()
    revolve(axis=Axis((0, 0, 0), (0, 0, 1)), mode=Mode.SUBTRACT)


solid = Compound([f4.part, f1_7.part])
